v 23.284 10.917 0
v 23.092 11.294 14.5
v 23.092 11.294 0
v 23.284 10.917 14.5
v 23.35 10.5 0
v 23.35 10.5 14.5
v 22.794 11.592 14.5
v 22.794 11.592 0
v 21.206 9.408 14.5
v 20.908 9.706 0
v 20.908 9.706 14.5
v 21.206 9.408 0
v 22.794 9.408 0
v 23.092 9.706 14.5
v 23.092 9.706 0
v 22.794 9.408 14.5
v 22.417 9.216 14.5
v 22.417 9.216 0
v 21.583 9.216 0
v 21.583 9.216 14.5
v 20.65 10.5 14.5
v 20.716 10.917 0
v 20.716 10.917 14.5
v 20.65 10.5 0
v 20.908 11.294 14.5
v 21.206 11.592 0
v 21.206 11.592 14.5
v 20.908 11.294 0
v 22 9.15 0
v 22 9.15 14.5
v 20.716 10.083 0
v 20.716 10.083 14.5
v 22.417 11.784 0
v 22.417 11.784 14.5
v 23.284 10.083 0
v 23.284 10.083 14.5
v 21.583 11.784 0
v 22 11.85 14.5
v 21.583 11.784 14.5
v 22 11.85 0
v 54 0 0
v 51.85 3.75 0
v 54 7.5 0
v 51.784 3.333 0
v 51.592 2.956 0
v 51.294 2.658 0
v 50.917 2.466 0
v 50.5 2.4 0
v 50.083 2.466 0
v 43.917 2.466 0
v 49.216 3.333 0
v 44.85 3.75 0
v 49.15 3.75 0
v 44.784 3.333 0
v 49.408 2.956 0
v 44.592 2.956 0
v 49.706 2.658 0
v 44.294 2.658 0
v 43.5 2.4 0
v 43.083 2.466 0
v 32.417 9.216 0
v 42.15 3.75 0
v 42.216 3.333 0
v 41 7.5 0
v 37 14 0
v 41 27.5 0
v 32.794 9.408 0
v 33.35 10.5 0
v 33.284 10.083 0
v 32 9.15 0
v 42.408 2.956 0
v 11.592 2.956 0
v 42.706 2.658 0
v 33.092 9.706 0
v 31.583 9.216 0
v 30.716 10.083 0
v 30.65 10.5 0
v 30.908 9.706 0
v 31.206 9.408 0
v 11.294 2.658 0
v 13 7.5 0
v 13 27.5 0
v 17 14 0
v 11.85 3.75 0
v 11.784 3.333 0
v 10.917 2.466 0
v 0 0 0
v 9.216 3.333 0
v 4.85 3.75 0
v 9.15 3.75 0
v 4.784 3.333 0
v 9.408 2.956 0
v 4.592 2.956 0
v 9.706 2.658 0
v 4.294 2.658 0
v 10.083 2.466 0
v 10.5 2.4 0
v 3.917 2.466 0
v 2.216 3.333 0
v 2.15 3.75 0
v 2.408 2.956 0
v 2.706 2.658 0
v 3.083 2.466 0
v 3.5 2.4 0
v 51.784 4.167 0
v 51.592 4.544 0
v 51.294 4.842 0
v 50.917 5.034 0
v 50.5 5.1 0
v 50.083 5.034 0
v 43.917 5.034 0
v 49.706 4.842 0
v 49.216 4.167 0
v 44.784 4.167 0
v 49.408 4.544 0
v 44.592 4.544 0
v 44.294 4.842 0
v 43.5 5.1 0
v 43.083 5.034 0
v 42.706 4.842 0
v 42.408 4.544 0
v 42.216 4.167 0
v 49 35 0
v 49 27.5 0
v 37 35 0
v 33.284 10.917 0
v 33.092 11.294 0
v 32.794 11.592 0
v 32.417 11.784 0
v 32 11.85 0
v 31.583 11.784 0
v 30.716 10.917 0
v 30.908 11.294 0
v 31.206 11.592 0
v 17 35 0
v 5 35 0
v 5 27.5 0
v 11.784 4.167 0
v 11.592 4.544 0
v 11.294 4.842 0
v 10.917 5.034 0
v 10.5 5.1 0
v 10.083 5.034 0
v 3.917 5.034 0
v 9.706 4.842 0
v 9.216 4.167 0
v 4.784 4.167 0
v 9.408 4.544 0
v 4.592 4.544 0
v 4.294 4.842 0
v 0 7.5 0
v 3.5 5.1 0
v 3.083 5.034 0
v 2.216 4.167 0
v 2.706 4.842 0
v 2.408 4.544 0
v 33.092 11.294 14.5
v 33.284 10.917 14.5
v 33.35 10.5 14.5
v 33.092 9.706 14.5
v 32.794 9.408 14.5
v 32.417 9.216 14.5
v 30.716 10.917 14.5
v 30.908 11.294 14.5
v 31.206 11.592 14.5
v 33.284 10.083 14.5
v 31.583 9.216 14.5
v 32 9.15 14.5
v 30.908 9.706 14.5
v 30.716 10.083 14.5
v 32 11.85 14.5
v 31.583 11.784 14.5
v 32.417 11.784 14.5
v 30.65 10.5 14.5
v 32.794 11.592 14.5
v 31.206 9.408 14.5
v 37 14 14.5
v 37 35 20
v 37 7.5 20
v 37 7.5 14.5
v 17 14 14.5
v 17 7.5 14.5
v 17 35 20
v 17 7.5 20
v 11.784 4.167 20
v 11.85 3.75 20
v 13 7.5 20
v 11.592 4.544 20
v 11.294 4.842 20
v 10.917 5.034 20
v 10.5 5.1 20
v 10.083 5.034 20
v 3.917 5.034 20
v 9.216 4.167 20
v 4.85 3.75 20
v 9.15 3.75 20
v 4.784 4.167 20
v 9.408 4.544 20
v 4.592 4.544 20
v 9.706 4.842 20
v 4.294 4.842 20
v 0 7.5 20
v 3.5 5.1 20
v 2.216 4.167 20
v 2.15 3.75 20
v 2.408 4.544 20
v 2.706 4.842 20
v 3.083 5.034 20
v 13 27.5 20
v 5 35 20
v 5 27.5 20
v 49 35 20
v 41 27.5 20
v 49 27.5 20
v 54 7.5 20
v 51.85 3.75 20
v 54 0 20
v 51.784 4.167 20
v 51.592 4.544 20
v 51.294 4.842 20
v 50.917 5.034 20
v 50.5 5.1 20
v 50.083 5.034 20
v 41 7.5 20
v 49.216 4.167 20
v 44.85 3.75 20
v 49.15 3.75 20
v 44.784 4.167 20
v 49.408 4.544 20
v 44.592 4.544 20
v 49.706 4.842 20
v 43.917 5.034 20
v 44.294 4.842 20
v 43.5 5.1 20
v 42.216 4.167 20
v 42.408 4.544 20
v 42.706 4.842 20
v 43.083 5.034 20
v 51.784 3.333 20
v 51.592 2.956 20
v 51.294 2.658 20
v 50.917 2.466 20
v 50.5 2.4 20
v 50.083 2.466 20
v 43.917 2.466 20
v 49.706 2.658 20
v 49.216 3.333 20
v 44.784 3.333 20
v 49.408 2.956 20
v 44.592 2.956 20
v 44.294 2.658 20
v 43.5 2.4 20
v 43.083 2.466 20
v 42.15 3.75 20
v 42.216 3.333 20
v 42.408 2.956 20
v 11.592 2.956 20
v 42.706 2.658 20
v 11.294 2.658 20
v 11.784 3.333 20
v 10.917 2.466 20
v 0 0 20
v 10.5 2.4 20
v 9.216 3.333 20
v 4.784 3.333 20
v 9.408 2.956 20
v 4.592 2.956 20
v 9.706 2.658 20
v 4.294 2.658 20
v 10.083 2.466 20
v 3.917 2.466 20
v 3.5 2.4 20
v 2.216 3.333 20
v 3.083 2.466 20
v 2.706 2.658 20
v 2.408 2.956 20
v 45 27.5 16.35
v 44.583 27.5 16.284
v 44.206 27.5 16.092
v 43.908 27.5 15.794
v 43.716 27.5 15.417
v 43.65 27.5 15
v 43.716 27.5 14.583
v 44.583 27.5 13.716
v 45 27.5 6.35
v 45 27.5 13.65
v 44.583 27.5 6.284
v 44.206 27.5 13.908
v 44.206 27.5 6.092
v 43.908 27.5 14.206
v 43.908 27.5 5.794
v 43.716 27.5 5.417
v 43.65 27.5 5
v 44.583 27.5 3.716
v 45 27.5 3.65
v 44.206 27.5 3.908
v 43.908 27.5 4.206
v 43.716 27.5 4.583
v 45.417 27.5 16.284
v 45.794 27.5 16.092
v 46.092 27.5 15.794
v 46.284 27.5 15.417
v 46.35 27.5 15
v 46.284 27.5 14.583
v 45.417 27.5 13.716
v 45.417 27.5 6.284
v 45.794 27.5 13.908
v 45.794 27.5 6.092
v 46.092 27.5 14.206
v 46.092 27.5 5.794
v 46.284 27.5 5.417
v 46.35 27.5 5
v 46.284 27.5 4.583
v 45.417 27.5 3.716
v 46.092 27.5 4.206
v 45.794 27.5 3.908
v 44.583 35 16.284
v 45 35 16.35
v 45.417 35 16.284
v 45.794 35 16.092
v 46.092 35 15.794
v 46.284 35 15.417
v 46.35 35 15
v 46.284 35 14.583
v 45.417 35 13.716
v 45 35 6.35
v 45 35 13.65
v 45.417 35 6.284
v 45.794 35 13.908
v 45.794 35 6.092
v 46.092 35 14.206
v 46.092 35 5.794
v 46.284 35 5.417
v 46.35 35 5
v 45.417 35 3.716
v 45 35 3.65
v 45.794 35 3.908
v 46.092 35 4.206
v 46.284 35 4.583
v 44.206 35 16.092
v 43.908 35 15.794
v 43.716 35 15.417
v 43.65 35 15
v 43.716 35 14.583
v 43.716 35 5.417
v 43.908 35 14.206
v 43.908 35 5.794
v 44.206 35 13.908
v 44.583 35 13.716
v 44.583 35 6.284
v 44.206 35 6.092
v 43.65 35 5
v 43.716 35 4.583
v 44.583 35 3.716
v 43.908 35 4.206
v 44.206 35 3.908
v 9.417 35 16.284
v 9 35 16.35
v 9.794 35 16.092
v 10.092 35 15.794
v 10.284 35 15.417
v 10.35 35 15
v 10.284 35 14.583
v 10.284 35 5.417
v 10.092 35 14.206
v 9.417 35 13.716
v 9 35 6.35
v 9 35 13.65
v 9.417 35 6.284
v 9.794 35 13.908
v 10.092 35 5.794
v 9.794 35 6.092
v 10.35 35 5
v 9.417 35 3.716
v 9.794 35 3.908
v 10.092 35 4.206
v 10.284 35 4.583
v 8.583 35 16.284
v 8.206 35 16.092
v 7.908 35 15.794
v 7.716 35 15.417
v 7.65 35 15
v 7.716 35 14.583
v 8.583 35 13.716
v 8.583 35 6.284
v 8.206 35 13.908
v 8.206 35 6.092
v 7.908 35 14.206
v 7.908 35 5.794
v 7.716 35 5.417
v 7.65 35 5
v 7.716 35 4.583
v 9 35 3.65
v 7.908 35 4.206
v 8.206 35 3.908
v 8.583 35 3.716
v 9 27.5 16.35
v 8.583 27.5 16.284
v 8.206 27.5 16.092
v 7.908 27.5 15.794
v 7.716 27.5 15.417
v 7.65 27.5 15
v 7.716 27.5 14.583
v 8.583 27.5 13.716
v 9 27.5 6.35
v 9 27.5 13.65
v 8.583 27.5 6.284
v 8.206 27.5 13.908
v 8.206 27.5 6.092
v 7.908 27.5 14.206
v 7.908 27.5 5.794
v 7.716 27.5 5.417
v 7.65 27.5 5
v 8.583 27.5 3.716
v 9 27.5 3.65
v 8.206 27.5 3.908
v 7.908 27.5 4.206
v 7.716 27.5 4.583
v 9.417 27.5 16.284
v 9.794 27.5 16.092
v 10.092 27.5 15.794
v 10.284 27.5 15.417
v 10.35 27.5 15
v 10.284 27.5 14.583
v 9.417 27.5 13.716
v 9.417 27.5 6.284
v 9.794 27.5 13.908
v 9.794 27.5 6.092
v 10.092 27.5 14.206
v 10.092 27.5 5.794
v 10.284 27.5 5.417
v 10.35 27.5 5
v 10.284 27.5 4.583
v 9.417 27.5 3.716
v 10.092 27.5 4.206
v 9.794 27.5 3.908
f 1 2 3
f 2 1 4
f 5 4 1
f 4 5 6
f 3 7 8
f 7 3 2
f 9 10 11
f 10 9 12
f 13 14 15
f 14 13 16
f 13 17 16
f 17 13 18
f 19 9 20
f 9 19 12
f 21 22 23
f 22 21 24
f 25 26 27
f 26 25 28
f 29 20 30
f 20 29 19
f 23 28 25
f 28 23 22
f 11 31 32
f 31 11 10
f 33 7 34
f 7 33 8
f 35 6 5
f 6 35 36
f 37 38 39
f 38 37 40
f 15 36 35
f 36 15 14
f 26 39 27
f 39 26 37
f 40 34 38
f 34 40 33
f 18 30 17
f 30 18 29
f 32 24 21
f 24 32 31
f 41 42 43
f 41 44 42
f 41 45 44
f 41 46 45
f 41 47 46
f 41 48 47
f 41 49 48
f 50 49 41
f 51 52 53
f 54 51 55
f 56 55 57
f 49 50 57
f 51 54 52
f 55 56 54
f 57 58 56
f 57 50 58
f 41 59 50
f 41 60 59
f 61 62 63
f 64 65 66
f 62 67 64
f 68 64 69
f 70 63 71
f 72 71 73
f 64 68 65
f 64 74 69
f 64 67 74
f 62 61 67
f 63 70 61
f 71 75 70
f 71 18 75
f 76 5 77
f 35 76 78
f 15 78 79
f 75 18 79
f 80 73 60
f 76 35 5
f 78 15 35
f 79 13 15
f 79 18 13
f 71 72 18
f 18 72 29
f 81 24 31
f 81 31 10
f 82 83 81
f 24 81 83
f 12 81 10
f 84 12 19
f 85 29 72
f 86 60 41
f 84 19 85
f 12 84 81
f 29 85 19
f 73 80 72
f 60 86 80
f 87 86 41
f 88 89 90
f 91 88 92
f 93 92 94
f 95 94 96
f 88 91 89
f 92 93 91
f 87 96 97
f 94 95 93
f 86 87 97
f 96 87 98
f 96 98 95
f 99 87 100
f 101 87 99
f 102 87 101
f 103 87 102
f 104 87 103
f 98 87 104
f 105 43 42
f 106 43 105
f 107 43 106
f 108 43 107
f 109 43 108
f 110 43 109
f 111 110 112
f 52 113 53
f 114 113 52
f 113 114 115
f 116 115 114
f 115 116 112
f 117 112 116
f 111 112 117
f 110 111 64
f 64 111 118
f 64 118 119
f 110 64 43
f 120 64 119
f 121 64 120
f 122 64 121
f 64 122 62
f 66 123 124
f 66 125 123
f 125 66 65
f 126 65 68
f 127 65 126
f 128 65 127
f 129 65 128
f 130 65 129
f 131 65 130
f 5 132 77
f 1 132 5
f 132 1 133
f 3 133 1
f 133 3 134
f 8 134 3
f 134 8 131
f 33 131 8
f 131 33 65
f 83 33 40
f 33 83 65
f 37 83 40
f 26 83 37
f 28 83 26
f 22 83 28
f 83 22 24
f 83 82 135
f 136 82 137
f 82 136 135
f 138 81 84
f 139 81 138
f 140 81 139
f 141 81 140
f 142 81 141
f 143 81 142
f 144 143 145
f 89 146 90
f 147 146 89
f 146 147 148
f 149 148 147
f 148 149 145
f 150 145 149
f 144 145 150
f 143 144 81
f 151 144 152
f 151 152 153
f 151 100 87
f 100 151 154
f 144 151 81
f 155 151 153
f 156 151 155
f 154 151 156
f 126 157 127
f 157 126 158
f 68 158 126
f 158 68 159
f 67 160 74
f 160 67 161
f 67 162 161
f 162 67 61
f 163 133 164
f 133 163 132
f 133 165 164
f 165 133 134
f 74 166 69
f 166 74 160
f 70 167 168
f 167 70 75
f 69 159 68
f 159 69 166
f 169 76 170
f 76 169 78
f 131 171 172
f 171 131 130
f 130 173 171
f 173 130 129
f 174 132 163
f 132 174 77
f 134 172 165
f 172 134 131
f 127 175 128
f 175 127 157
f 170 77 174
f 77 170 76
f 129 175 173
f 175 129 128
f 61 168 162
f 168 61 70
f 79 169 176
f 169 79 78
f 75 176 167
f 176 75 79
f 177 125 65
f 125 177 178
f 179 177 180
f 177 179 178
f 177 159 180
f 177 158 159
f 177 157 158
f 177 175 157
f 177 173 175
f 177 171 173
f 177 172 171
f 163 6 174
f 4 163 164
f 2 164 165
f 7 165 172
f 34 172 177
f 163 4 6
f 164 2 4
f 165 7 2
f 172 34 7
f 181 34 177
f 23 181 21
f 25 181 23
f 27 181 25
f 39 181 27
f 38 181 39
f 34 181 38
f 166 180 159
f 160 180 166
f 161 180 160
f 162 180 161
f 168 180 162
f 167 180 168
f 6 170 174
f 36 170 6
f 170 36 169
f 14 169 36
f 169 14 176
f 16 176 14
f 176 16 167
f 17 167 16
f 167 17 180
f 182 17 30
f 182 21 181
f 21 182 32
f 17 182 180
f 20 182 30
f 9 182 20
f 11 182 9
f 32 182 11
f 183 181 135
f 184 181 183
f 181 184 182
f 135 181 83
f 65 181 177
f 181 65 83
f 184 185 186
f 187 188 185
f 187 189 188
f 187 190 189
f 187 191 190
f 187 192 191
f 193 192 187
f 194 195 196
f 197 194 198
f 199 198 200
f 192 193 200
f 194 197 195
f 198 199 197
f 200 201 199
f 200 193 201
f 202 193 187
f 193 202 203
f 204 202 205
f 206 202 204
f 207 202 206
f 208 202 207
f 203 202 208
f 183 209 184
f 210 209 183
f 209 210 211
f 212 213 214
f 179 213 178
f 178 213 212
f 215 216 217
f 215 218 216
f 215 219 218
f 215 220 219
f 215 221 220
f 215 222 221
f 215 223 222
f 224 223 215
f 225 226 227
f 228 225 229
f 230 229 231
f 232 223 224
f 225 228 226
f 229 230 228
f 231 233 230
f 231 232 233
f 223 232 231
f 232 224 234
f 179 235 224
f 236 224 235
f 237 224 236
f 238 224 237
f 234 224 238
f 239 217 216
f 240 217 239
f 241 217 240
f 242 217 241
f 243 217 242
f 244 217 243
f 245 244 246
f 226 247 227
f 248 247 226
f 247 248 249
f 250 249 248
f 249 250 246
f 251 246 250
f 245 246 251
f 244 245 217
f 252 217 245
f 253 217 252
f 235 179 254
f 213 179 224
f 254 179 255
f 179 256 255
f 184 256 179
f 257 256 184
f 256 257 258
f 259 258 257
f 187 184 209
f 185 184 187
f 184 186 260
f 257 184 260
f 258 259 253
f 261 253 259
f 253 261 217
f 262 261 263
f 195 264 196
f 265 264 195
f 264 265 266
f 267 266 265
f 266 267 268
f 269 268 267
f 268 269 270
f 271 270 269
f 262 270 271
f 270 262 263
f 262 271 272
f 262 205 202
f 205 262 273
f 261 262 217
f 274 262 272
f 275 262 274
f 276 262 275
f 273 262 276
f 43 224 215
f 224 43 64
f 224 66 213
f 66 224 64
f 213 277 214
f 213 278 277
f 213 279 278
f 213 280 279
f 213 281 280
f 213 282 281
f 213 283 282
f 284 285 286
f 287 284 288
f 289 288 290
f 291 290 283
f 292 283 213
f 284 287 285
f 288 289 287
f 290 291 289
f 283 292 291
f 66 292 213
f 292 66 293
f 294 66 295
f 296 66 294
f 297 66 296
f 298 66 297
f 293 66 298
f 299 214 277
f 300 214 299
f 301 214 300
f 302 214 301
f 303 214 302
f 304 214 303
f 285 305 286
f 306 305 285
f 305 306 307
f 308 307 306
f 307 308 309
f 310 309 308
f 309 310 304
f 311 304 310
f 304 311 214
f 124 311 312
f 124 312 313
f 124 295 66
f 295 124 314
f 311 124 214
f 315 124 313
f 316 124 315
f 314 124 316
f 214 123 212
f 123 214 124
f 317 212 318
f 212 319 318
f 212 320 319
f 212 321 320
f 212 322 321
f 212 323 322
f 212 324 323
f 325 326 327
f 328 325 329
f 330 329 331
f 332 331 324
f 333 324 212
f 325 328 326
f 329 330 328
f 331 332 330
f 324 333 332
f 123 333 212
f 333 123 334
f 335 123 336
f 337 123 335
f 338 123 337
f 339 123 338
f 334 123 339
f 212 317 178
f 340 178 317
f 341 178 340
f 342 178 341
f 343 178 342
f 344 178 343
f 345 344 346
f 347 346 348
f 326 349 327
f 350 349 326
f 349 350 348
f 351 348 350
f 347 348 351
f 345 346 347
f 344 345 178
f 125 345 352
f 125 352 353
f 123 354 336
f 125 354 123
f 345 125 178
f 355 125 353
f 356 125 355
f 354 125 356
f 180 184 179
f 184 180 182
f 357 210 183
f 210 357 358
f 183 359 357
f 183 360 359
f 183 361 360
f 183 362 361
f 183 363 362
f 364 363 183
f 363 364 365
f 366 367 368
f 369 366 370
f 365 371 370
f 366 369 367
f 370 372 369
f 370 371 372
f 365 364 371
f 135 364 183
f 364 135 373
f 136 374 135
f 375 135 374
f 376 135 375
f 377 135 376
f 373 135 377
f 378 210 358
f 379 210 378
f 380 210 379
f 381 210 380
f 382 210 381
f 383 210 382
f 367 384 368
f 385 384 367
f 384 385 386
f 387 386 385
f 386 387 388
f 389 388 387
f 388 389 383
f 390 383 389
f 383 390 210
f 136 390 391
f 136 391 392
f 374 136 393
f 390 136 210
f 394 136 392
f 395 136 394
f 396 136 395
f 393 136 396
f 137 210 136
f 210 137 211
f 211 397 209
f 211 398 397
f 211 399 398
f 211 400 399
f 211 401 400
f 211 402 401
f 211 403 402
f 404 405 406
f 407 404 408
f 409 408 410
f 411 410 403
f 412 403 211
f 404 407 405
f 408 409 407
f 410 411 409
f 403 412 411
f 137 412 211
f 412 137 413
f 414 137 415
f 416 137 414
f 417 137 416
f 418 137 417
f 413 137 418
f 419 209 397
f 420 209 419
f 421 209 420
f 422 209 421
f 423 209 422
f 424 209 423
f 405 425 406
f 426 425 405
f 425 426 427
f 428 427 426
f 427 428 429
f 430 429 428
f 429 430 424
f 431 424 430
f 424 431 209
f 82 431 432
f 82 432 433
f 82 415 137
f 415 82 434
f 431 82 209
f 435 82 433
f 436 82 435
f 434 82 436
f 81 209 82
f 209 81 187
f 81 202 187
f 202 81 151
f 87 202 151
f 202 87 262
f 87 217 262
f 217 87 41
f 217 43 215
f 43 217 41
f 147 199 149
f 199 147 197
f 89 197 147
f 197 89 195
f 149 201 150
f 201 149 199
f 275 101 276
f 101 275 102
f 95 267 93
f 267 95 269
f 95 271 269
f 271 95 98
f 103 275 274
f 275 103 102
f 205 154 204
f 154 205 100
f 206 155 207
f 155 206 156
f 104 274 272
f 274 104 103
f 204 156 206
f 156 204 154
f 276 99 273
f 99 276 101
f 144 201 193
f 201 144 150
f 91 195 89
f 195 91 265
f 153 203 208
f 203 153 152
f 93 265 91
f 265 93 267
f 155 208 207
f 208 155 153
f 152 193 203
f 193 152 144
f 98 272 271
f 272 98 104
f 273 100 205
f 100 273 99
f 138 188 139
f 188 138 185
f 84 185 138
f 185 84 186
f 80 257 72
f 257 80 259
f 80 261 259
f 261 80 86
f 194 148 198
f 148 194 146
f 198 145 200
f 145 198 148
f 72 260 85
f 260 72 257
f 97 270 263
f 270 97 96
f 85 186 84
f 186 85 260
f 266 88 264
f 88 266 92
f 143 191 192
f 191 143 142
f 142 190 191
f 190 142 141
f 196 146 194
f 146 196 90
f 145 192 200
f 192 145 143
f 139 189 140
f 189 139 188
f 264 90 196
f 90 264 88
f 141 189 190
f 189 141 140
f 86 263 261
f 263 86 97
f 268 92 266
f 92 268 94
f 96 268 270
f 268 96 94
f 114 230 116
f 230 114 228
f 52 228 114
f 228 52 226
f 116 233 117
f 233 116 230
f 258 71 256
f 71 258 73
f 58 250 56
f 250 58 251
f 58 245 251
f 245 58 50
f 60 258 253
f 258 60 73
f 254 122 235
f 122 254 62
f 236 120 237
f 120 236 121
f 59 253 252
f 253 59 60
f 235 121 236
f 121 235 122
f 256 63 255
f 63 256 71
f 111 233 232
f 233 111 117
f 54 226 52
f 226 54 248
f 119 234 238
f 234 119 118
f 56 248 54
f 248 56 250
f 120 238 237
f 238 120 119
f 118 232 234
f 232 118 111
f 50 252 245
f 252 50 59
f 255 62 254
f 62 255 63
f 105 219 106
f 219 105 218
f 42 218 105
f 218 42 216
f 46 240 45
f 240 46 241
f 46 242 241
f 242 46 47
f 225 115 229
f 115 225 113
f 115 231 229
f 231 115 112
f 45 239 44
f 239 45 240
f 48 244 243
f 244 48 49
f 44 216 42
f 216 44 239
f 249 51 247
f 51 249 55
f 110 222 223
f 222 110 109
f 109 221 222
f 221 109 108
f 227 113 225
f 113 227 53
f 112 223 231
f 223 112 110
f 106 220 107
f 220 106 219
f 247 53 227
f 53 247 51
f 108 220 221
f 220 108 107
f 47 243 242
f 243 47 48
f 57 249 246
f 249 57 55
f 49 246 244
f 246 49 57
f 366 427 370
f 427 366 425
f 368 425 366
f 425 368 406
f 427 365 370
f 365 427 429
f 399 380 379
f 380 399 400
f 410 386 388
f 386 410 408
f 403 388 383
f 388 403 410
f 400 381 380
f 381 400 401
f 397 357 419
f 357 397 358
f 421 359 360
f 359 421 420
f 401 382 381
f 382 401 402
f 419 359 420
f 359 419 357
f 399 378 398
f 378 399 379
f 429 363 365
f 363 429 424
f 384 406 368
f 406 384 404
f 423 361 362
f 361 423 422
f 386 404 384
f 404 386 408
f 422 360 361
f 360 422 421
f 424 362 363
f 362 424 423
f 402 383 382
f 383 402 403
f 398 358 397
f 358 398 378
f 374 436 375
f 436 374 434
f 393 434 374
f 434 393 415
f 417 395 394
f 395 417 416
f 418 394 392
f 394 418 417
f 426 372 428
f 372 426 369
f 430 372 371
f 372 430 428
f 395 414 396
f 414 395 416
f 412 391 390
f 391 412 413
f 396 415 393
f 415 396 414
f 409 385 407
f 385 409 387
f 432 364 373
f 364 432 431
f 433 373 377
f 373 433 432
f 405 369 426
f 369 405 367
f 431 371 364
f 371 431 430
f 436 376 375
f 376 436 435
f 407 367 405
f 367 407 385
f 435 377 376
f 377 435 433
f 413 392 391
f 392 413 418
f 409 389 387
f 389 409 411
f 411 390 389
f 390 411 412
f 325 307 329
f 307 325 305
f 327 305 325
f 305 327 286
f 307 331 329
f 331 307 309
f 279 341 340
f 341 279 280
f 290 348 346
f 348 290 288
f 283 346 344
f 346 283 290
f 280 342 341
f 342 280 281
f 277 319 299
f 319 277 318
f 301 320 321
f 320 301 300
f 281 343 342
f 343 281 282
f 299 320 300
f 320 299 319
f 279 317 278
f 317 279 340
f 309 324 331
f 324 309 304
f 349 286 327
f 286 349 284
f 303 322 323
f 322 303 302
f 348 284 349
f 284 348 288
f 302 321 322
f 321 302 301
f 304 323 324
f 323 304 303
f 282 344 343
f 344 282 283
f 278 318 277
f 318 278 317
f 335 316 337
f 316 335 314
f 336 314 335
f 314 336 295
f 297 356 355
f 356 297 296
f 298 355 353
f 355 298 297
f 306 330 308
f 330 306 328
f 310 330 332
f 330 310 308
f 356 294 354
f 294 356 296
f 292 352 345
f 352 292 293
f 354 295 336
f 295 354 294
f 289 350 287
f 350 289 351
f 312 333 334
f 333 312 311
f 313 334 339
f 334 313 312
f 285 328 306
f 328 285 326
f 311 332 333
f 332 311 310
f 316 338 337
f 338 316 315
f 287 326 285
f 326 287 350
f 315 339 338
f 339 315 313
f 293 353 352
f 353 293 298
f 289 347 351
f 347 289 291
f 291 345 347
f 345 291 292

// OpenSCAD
function rel_to_abs(list, i = 0, sum = [0,0], result = []) = 
    i == len(list) ? result : rel_to_abs(list, i + 1, sum + list[i], concat(result, [sum + list[i]]));

module doubleHoles() {
cylinder(h = 20, r = 2.7/2, $fn=20);
translate([7,0,0]) cylinder(h = 20, r = 2.7/2, $fn=20);
}

module wideDoubleHoles() {
  cylinder(h = 20, r = 2.7/2, $fn=20);
  translate([10,0,0]) cylinder(h = 20, r = 2.7/2, $fn=20);
}

module servoLip() {
  difference() {
    linear_extrude(14.5) polygon(rel_to_abs([[0,0],[20,0], [0, 7], [-20,0]]));
    translate([5, 3.5, 0]) wideDoubleHoles();
  }
}



difference() {
  union() {    
    linear_extrude(20) polygon(rel_to_abs([[0,0],[54,0],[0,7.5],[-13,0],[0,20],[8,0],[0,7.5],[-12,0],[0,-27.5],[-20,0],[0,27.5],[-12,0],[0,-7.5],[8,0],[0,-20],[-13,0]]));

    translate([17,7,0]) servoLip();
  }

  translate([3.5, 3.75, 0]) doubleHoles();
  translate([43.5, 3.75, 0]) doubleHoles();
  translate([9, 40, 15]) rotate([90,90,0]) wideDoubleHoles();
  translate([45, 40, 15]) rotate([90,90,0]) wideDoubleHoles();
}
